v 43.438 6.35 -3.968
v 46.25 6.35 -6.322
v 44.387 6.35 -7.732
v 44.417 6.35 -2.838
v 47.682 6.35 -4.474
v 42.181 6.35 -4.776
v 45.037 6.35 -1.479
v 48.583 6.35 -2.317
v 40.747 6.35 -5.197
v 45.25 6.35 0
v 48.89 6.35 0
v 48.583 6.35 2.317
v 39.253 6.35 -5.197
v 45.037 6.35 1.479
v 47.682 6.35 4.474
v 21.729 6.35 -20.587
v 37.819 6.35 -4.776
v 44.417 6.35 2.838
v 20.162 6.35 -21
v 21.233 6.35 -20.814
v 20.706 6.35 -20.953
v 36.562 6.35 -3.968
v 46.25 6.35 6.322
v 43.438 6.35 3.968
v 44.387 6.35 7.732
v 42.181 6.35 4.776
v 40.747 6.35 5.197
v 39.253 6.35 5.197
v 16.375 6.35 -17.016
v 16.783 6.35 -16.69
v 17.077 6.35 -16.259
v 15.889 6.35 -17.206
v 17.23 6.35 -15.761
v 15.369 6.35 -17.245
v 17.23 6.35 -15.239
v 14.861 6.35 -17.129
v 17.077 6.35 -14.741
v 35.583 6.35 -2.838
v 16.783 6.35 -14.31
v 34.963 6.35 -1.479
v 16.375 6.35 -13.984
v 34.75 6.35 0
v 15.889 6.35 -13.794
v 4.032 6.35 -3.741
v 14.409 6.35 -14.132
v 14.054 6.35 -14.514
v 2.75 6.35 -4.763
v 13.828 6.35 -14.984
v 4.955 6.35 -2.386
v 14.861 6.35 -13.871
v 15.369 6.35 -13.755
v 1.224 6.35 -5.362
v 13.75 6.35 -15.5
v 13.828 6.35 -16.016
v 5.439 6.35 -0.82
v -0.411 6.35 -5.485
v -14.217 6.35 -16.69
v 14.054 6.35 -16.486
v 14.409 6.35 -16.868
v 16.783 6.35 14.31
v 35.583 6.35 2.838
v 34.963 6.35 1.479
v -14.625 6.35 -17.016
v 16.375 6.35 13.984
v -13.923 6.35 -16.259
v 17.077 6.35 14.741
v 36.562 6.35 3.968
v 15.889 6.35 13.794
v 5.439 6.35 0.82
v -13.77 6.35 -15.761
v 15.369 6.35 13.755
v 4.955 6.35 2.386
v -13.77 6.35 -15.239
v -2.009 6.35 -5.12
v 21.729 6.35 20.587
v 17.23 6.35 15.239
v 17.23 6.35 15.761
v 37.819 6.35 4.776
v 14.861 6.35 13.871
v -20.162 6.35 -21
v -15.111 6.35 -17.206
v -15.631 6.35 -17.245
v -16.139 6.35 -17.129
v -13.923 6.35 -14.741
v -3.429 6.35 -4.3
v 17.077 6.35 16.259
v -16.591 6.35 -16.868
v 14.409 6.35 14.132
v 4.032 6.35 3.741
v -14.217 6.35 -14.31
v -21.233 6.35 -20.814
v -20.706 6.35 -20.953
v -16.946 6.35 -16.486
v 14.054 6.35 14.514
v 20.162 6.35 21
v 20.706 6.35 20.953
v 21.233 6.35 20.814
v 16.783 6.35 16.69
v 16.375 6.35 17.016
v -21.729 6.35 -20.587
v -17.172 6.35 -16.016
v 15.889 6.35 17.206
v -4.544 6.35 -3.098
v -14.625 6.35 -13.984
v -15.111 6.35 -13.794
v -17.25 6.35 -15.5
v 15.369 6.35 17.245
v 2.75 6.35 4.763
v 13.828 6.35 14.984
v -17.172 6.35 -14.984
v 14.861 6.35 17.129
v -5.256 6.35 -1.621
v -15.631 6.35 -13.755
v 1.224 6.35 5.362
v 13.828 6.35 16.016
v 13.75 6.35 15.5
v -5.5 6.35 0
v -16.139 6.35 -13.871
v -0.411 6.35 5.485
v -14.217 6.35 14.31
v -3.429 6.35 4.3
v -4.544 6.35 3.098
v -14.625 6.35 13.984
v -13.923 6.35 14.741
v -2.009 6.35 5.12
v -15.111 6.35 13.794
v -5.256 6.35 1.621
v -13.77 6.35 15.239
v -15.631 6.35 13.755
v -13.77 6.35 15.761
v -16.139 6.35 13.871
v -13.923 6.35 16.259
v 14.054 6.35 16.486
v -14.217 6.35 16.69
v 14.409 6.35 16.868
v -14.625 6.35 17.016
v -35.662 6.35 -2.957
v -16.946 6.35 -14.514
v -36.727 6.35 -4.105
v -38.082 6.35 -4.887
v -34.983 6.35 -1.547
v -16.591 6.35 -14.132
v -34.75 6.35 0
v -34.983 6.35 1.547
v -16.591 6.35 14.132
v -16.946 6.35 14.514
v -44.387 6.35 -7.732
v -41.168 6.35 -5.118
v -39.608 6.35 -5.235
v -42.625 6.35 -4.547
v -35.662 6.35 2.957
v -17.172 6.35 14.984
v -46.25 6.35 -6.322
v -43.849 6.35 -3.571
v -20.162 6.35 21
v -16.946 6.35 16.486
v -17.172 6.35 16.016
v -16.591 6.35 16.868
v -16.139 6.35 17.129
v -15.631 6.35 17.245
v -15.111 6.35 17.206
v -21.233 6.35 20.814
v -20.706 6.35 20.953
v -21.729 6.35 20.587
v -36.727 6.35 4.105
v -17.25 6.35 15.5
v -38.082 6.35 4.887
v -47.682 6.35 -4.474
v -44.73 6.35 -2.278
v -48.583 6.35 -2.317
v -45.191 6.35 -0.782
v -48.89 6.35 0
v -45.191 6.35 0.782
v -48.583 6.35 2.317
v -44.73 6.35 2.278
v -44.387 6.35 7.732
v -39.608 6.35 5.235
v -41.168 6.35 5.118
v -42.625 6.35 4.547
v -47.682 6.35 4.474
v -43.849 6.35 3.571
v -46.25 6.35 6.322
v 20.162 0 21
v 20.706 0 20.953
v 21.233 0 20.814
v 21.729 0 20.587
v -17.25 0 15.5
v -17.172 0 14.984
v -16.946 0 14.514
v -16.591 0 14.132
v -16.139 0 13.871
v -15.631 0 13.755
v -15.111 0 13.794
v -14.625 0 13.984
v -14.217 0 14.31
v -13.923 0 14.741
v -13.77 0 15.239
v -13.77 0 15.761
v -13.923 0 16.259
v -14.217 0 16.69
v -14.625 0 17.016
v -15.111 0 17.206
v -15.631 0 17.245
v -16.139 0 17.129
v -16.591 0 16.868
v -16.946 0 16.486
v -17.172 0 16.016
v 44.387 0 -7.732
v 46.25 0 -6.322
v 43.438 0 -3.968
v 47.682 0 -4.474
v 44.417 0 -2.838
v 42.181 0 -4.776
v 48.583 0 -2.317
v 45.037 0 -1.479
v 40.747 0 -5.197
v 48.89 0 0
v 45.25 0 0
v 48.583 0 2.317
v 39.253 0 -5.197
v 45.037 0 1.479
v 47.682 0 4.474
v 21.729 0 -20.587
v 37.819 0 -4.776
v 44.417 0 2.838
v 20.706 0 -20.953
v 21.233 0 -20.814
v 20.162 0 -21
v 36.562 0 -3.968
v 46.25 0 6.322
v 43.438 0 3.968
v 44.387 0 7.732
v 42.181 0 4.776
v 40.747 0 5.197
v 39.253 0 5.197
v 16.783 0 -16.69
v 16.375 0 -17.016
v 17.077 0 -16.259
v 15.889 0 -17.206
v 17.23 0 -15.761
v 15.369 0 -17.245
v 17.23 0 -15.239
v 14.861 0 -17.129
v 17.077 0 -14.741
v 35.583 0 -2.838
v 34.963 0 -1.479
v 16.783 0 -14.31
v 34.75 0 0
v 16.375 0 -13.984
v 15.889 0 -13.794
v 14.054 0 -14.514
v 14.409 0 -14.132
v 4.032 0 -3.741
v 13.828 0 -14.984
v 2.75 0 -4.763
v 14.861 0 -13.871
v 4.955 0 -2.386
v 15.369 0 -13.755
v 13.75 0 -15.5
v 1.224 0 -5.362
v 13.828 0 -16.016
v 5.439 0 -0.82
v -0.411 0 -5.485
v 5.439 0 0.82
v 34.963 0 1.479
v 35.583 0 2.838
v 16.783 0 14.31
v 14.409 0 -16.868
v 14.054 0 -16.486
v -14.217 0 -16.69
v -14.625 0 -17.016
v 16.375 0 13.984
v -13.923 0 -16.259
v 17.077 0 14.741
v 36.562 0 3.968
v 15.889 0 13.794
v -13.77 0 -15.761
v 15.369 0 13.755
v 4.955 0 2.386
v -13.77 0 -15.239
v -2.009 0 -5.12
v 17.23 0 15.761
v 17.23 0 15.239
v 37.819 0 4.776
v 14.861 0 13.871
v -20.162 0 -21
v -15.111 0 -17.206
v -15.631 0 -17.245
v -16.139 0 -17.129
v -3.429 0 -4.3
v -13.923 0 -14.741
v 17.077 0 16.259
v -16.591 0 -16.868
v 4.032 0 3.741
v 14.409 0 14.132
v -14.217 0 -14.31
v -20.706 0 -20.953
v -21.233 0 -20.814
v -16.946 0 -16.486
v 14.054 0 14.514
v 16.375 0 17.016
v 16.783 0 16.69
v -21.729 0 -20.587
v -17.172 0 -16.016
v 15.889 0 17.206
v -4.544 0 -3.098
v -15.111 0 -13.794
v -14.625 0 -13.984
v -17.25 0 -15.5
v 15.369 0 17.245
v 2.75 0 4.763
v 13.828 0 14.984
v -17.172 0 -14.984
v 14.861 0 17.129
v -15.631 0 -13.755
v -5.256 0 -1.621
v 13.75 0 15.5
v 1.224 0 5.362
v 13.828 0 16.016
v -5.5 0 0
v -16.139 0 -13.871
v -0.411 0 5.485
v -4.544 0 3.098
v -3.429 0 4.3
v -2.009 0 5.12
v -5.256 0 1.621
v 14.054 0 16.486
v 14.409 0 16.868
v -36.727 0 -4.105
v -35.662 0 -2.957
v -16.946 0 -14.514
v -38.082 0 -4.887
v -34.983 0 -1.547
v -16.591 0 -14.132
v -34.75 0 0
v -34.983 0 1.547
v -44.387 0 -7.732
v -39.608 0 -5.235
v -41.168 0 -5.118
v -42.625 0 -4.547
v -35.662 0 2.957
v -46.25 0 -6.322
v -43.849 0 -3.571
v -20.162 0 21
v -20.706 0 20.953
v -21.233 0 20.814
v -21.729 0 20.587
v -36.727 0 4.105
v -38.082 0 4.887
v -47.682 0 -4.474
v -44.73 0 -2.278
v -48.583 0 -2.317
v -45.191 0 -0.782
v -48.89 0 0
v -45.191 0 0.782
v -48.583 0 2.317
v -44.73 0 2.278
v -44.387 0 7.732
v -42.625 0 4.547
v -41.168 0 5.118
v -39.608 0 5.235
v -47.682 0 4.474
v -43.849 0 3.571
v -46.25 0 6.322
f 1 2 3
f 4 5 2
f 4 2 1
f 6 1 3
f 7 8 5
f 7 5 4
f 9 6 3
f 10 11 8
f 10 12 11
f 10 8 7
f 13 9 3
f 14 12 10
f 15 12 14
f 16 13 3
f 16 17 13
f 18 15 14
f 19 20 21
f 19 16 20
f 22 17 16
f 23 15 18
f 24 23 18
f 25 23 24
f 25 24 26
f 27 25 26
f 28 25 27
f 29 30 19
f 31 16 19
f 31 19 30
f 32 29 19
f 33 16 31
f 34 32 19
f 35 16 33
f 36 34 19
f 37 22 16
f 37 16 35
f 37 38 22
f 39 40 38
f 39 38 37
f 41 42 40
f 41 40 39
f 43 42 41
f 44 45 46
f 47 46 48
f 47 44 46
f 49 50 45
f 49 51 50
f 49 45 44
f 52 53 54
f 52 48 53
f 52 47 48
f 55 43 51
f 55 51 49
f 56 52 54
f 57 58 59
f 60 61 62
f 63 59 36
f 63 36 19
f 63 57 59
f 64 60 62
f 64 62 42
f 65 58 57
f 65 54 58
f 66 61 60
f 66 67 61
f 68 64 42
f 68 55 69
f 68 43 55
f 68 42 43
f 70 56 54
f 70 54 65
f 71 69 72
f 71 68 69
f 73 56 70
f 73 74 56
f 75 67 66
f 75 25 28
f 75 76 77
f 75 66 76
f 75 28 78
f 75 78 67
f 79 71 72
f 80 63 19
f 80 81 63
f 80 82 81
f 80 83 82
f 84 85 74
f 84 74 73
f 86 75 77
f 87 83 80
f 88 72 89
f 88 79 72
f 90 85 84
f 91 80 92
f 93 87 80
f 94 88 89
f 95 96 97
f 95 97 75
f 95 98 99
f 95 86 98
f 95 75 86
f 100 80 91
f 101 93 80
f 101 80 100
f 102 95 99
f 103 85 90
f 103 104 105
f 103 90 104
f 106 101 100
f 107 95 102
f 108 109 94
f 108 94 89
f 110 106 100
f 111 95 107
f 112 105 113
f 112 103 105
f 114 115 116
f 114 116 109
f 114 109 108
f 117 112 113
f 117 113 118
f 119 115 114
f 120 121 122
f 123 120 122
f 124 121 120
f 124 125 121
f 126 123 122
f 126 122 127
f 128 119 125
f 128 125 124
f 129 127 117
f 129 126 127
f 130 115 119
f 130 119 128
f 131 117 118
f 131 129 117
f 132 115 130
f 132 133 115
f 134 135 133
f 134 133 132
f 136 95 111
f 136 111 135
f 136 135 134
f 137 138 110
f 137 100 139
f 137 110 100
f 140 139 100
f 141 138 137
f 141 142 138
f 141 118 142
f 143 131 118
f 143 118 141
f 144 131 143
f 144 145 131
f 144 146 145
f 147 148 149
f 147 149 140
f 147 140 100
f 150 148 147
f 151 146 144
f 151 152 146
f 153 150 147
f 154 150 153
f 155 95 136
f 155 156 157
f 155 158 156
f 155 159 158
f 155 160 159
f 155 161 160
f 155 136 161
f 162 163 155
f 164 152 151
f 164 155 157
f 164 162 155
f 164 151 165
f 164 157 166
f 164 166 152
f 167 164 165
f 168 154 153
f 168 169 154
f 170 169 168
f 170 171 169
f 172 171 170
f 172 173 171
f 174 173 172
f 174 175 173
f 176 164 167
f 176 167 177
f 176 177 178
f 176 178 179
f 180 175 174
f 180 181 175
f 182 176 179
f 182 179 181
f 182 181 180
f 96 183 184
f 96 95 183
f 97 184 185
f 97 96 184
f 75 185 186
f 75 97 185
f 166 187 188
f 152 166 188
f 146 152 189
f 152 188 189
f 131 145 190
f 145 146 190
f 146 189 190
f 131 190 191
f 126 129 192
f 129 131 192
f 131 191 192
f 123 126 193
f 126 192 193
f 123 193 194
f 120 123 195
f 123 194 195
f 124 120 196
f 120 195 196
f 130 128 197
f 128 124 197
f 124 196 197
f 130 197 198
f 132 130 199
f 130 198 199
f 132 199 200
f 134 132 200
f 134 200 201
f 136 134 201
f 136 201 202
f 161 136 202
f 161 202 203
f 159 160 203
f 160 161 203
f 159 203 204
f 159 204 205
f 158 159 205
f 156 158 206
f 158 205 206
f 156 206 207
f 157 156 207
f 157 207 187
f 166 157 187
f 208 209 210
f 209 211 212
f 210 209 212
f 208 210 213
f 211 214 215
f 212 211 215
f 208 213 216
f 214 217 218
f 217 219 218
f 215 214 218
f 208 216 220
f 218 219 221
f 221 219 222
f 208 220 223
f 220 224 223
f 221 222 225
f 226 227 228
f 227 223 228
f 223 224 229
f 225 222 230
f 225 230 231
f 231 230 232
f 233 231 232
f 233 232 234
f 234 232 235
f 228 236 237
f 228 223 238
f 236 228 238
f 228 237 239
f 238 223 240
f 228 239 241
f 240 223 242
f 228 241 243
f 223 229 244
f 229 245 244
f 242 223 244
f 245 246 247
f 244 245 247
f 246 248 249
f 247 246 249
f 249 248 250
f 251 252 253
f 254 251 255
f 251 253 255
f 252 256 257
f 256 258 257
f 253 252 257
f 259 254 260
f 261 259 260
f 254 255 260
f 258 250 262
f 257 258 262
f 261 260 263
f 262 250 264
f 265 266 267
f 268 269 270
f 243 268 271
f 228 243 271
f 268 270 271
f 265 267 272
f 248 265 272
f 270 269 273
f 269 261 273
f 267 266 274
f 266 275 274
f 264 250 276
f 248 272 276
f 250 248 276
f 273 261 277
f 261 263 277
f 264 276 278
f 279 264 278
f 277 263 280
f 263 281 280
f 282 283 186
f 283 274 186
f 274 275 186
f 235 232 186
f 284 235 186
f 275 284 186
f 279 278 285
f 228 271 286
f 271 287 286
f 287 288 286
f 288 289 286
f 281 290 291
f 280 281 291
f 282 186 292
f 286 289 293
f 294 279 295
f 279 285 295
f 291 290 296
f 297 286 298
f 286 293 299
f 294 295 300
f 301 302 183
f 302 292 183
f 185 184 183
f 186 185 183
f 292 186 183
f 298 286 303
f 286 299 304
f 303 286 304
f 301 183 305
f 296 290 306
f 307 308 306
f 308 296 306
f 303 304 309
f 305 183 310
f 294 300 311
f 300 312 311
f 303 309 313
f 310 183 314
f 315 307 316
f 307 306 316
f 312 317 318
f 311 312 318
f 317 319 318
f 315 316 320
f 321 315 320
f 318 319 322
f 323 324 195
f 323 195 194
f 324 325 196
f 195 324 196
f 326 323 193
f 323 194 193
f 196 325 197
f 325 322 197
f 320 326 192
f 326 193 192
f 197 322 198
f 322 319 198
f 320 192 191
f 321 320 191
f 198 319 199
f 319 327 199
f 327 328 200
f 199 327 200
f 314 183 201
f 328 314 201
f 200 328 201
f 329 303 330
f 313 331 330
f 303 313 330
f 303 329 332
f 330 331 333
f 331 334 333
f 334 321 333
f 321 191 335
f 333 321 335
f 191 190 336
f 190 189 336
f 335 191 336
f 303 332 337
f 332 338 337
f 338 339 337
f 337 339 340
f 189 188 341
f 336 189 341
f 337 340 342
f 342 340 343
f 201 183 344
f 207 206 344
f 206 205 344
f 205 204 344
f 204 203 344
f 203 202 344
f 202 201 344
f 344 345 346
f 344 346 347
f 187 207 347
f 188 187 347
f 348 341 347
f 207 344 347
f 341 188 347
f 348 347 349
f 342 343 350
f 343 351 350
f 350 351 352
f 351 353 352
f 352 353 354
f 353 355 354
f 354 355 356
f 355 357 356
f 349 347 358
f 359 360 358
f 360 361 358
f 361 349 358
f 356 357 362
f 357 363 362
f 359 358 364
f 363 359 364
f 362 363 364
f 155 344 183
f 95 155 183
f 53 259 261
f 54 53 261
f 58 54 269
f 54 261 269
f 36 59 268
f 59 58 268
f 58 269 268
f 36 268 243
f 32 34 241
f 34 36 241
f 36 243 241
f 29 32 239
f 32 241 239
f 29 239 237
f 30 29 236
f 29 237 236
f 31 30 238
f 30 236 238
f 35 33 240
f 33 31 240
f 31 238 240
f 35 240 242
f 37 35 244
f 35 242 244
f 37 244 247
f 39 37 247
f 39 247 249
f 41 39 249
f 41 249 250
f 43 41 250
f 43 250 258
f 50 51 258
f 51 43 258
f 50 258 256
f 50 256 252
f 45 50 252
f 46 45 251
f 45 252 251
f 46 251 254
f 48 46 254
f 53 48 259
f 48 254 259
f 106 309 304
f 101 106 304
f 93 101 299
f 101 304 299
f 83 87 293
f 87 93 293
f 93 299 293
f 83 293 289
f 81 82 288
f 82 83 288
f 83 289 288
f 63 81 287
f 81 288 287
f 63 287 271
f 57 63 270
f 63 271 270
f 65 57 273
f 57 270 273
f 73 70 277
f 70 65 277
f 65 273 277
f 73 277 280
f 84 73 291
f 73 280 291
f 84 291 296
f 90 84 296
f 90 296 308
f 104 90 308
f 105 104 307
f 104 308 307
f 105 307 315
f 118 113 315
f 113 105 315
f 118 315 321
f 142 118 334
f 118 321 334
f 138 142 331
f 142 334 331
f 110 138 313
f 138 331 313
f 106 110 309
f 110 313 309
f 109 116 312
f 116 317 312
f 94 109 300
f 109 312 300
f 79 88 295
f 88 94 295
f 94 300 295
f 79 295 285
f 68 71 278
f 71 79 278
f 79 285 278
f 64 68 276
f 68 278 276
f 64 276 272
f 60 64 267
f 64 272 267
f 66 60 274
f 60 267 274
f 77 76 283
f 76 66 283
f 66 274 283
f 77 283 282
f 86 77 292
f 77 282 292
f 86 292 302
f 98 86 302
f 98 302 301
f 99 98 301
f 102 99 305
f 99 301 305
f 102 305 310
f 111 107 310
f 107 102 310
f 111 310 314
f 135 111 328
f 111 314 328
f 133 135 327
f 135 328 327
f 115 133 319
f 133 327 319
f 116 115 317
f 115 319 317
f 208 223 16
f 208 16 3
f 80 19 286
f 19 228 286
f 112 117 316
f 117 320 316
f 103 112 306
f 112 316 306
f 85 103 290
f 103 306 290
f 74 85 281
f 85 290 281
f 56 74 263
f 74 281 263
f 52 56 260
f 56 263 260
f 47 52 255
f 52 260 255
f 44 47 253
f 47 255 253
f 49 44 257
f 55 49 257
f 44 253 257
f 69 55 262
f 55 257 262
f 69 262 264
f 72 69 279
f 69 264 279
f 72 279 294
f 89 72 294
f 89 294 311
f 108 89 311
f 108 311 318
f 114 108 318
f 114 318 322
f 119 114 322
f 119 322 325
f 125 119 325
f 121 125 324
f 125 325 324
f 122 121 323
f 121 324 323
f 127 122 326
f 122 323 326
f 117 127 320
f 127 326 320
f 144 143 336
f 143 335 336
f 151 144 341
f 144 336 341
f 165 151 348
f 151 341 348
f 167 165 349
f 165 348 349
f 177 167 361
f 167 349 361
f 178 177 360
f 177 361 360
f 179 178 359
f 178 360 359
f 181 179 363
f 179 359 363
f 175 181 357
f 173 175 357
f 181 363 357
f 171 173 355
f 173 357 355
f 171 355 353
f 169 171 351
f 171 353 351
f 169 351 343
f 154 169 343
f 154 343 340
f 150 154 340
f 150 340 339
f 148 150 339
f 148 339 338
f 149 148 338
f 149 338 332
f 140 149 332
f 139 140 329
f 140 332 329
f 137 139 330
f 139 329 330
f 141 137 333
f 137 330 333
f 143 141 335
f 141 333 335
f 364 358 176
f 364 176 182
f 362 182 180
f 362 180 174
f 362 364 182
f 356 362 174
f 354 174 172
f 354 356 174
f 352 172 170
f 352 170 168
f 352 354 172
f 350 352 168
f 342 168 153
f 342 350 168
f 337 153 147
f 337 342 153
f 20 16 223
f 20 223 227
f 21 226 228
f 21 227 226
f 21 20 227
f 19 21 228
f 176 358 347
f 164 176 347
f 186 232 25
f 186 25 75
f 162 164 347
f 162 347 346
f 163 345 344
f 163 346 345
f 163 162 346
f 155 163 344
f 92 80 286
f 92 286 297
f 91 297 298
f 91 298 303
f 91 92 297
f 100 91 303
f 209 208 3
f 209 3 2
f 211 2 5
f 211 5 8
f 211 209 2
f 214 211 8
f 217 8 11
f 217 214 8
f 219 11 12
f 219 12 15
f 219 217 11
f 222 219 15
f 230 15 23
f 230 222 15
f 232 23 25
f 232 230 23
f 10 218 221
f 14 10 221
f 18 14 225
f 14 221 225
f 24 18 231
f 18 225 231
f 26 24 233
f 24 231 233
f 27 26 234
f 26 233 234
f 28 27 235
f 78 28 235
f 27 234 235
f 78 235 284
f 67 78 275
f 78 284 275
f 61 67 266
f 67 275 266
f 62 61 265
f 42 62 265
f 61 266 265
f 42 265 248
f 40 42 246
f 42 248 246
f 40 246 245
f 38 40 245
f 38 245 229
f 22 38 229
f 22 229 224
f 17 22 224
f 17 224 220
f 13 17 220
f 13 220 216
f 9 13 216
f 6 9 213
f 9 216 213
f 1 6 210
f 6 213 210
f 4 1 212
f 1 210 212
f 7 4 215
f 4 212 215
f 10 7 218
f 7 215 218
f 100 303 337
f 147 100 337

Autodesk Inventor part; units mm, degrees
ref_plane "YZ Plane" through (0, 0, 0) normal (1, 0, 0) x (0, 1, 0)
ref_plane "XZ Plane" through (0, 0, 0) normal (0, 1, 0) x (-1, 0, 0)
ref_plane "XY Plane" through (0, 0, 0) normal (0, 0, 1) x (1, 0, 0)
sketch "Sketch1" plane through (0, 0, 0) normal (0, 1, 0) x (-1, 0, 0)
  line L0 (-21, -21) -> (21, -21)
  line L1 (21, -21) -> (21, 21)
  line L2 (21, 21) -> (-21, 21)
  line L3 (-21, 21) -> (-21, -21)
  line L4 (-21, -21) -> (21, 21) construction
  line L5 (21, -21) -> (-21, 21) construction
  circle A0 centre (15.5, 15.5) radius 1.75
  circle A1 centre (0, 0) radius 5.5
  line L6 (34.796, 0) -> (-29.6686, 0)
  line L7 (0, -38.1967) -> (0, 38.2612)
  circle A2 centre (15.5, -15.5) radius 1.75
  circle A3 centre (-15.5, 15.5) radius 1.75
  circle A4 centre (-15.5, -15.5) radius 1.75
  dimension "d0" = 42
  dimension "d1" = 42
  dimension "d4" = 3.5
  dimension "d8" = 11
  dimension "d13" = 31
extrude "Extrusion4" add sketch "Sketch1" along normal blind 6.35 contours L3 L6 A1 L7 L0 | L7 A1 L6 L1 L0 | L3 L2 L7 A1 L6 | L6 A1 L7 L2 L1
sketch "Sketch2" plane through (0, 0, 0) normal (0, -1, 0) x (1, 0, 0)
  line L0 (0, 45.4999) -> (0, -47.5937)
  line L1 (43.084, 0) -> (-45.3389, 0)
  arc A0 (-44.3867, 7.7323) -> (-44.3867, -7.7323) centre (-40, 0) ccw
  line L2 (-21, -21) -> (-21, 21) projected
  arc A1 (44.3867, -7.7323) -> (44.3867, 7.7323) centre (40, 0) ccw
  line L3 (-21, 21) -> (-21, -21)
  line L4 (-21, -21) -> (-21, 21) projected
  line L5 (21, 21) -> (21, -21)
  line L6 (21, 21) -> (21, -21) projected
  circle A2 centre (-40, 0) radius 5.25
  circle A3 centre (40, 0) radius 5.25
  line L7 (-21, -21) -> (-44.3867, -7.7323)
  line L8 (-44.3867, 7.7323) -> (-21, 21)
  line L9 (-21, 21) -> (-21, -21)
  line L10 (21, -21) -> (44.3867, -7.7323)
  line L11 (44.3867, 7.7323) -> (21, 21)
  point P0 (0, 0)
  dimension "d18" = 10.5
  dimension "d20" = 80
  dimension "d21" = 8.89
extrude "Extrusion5" add sketch "Sketch2" against normal up to surface (6.35 mm away)
fillet "Fillet1" radius 3.175 4 edges at (-21, 3.175, -21) (21, 3.175, -21) (21, 3.175, 21) (-21, 3.175, 21)
equation "\"d0\" = d1"
properties part number "Vertical_Lead_Screw_Shaft_Mount_Plate_Mid"
